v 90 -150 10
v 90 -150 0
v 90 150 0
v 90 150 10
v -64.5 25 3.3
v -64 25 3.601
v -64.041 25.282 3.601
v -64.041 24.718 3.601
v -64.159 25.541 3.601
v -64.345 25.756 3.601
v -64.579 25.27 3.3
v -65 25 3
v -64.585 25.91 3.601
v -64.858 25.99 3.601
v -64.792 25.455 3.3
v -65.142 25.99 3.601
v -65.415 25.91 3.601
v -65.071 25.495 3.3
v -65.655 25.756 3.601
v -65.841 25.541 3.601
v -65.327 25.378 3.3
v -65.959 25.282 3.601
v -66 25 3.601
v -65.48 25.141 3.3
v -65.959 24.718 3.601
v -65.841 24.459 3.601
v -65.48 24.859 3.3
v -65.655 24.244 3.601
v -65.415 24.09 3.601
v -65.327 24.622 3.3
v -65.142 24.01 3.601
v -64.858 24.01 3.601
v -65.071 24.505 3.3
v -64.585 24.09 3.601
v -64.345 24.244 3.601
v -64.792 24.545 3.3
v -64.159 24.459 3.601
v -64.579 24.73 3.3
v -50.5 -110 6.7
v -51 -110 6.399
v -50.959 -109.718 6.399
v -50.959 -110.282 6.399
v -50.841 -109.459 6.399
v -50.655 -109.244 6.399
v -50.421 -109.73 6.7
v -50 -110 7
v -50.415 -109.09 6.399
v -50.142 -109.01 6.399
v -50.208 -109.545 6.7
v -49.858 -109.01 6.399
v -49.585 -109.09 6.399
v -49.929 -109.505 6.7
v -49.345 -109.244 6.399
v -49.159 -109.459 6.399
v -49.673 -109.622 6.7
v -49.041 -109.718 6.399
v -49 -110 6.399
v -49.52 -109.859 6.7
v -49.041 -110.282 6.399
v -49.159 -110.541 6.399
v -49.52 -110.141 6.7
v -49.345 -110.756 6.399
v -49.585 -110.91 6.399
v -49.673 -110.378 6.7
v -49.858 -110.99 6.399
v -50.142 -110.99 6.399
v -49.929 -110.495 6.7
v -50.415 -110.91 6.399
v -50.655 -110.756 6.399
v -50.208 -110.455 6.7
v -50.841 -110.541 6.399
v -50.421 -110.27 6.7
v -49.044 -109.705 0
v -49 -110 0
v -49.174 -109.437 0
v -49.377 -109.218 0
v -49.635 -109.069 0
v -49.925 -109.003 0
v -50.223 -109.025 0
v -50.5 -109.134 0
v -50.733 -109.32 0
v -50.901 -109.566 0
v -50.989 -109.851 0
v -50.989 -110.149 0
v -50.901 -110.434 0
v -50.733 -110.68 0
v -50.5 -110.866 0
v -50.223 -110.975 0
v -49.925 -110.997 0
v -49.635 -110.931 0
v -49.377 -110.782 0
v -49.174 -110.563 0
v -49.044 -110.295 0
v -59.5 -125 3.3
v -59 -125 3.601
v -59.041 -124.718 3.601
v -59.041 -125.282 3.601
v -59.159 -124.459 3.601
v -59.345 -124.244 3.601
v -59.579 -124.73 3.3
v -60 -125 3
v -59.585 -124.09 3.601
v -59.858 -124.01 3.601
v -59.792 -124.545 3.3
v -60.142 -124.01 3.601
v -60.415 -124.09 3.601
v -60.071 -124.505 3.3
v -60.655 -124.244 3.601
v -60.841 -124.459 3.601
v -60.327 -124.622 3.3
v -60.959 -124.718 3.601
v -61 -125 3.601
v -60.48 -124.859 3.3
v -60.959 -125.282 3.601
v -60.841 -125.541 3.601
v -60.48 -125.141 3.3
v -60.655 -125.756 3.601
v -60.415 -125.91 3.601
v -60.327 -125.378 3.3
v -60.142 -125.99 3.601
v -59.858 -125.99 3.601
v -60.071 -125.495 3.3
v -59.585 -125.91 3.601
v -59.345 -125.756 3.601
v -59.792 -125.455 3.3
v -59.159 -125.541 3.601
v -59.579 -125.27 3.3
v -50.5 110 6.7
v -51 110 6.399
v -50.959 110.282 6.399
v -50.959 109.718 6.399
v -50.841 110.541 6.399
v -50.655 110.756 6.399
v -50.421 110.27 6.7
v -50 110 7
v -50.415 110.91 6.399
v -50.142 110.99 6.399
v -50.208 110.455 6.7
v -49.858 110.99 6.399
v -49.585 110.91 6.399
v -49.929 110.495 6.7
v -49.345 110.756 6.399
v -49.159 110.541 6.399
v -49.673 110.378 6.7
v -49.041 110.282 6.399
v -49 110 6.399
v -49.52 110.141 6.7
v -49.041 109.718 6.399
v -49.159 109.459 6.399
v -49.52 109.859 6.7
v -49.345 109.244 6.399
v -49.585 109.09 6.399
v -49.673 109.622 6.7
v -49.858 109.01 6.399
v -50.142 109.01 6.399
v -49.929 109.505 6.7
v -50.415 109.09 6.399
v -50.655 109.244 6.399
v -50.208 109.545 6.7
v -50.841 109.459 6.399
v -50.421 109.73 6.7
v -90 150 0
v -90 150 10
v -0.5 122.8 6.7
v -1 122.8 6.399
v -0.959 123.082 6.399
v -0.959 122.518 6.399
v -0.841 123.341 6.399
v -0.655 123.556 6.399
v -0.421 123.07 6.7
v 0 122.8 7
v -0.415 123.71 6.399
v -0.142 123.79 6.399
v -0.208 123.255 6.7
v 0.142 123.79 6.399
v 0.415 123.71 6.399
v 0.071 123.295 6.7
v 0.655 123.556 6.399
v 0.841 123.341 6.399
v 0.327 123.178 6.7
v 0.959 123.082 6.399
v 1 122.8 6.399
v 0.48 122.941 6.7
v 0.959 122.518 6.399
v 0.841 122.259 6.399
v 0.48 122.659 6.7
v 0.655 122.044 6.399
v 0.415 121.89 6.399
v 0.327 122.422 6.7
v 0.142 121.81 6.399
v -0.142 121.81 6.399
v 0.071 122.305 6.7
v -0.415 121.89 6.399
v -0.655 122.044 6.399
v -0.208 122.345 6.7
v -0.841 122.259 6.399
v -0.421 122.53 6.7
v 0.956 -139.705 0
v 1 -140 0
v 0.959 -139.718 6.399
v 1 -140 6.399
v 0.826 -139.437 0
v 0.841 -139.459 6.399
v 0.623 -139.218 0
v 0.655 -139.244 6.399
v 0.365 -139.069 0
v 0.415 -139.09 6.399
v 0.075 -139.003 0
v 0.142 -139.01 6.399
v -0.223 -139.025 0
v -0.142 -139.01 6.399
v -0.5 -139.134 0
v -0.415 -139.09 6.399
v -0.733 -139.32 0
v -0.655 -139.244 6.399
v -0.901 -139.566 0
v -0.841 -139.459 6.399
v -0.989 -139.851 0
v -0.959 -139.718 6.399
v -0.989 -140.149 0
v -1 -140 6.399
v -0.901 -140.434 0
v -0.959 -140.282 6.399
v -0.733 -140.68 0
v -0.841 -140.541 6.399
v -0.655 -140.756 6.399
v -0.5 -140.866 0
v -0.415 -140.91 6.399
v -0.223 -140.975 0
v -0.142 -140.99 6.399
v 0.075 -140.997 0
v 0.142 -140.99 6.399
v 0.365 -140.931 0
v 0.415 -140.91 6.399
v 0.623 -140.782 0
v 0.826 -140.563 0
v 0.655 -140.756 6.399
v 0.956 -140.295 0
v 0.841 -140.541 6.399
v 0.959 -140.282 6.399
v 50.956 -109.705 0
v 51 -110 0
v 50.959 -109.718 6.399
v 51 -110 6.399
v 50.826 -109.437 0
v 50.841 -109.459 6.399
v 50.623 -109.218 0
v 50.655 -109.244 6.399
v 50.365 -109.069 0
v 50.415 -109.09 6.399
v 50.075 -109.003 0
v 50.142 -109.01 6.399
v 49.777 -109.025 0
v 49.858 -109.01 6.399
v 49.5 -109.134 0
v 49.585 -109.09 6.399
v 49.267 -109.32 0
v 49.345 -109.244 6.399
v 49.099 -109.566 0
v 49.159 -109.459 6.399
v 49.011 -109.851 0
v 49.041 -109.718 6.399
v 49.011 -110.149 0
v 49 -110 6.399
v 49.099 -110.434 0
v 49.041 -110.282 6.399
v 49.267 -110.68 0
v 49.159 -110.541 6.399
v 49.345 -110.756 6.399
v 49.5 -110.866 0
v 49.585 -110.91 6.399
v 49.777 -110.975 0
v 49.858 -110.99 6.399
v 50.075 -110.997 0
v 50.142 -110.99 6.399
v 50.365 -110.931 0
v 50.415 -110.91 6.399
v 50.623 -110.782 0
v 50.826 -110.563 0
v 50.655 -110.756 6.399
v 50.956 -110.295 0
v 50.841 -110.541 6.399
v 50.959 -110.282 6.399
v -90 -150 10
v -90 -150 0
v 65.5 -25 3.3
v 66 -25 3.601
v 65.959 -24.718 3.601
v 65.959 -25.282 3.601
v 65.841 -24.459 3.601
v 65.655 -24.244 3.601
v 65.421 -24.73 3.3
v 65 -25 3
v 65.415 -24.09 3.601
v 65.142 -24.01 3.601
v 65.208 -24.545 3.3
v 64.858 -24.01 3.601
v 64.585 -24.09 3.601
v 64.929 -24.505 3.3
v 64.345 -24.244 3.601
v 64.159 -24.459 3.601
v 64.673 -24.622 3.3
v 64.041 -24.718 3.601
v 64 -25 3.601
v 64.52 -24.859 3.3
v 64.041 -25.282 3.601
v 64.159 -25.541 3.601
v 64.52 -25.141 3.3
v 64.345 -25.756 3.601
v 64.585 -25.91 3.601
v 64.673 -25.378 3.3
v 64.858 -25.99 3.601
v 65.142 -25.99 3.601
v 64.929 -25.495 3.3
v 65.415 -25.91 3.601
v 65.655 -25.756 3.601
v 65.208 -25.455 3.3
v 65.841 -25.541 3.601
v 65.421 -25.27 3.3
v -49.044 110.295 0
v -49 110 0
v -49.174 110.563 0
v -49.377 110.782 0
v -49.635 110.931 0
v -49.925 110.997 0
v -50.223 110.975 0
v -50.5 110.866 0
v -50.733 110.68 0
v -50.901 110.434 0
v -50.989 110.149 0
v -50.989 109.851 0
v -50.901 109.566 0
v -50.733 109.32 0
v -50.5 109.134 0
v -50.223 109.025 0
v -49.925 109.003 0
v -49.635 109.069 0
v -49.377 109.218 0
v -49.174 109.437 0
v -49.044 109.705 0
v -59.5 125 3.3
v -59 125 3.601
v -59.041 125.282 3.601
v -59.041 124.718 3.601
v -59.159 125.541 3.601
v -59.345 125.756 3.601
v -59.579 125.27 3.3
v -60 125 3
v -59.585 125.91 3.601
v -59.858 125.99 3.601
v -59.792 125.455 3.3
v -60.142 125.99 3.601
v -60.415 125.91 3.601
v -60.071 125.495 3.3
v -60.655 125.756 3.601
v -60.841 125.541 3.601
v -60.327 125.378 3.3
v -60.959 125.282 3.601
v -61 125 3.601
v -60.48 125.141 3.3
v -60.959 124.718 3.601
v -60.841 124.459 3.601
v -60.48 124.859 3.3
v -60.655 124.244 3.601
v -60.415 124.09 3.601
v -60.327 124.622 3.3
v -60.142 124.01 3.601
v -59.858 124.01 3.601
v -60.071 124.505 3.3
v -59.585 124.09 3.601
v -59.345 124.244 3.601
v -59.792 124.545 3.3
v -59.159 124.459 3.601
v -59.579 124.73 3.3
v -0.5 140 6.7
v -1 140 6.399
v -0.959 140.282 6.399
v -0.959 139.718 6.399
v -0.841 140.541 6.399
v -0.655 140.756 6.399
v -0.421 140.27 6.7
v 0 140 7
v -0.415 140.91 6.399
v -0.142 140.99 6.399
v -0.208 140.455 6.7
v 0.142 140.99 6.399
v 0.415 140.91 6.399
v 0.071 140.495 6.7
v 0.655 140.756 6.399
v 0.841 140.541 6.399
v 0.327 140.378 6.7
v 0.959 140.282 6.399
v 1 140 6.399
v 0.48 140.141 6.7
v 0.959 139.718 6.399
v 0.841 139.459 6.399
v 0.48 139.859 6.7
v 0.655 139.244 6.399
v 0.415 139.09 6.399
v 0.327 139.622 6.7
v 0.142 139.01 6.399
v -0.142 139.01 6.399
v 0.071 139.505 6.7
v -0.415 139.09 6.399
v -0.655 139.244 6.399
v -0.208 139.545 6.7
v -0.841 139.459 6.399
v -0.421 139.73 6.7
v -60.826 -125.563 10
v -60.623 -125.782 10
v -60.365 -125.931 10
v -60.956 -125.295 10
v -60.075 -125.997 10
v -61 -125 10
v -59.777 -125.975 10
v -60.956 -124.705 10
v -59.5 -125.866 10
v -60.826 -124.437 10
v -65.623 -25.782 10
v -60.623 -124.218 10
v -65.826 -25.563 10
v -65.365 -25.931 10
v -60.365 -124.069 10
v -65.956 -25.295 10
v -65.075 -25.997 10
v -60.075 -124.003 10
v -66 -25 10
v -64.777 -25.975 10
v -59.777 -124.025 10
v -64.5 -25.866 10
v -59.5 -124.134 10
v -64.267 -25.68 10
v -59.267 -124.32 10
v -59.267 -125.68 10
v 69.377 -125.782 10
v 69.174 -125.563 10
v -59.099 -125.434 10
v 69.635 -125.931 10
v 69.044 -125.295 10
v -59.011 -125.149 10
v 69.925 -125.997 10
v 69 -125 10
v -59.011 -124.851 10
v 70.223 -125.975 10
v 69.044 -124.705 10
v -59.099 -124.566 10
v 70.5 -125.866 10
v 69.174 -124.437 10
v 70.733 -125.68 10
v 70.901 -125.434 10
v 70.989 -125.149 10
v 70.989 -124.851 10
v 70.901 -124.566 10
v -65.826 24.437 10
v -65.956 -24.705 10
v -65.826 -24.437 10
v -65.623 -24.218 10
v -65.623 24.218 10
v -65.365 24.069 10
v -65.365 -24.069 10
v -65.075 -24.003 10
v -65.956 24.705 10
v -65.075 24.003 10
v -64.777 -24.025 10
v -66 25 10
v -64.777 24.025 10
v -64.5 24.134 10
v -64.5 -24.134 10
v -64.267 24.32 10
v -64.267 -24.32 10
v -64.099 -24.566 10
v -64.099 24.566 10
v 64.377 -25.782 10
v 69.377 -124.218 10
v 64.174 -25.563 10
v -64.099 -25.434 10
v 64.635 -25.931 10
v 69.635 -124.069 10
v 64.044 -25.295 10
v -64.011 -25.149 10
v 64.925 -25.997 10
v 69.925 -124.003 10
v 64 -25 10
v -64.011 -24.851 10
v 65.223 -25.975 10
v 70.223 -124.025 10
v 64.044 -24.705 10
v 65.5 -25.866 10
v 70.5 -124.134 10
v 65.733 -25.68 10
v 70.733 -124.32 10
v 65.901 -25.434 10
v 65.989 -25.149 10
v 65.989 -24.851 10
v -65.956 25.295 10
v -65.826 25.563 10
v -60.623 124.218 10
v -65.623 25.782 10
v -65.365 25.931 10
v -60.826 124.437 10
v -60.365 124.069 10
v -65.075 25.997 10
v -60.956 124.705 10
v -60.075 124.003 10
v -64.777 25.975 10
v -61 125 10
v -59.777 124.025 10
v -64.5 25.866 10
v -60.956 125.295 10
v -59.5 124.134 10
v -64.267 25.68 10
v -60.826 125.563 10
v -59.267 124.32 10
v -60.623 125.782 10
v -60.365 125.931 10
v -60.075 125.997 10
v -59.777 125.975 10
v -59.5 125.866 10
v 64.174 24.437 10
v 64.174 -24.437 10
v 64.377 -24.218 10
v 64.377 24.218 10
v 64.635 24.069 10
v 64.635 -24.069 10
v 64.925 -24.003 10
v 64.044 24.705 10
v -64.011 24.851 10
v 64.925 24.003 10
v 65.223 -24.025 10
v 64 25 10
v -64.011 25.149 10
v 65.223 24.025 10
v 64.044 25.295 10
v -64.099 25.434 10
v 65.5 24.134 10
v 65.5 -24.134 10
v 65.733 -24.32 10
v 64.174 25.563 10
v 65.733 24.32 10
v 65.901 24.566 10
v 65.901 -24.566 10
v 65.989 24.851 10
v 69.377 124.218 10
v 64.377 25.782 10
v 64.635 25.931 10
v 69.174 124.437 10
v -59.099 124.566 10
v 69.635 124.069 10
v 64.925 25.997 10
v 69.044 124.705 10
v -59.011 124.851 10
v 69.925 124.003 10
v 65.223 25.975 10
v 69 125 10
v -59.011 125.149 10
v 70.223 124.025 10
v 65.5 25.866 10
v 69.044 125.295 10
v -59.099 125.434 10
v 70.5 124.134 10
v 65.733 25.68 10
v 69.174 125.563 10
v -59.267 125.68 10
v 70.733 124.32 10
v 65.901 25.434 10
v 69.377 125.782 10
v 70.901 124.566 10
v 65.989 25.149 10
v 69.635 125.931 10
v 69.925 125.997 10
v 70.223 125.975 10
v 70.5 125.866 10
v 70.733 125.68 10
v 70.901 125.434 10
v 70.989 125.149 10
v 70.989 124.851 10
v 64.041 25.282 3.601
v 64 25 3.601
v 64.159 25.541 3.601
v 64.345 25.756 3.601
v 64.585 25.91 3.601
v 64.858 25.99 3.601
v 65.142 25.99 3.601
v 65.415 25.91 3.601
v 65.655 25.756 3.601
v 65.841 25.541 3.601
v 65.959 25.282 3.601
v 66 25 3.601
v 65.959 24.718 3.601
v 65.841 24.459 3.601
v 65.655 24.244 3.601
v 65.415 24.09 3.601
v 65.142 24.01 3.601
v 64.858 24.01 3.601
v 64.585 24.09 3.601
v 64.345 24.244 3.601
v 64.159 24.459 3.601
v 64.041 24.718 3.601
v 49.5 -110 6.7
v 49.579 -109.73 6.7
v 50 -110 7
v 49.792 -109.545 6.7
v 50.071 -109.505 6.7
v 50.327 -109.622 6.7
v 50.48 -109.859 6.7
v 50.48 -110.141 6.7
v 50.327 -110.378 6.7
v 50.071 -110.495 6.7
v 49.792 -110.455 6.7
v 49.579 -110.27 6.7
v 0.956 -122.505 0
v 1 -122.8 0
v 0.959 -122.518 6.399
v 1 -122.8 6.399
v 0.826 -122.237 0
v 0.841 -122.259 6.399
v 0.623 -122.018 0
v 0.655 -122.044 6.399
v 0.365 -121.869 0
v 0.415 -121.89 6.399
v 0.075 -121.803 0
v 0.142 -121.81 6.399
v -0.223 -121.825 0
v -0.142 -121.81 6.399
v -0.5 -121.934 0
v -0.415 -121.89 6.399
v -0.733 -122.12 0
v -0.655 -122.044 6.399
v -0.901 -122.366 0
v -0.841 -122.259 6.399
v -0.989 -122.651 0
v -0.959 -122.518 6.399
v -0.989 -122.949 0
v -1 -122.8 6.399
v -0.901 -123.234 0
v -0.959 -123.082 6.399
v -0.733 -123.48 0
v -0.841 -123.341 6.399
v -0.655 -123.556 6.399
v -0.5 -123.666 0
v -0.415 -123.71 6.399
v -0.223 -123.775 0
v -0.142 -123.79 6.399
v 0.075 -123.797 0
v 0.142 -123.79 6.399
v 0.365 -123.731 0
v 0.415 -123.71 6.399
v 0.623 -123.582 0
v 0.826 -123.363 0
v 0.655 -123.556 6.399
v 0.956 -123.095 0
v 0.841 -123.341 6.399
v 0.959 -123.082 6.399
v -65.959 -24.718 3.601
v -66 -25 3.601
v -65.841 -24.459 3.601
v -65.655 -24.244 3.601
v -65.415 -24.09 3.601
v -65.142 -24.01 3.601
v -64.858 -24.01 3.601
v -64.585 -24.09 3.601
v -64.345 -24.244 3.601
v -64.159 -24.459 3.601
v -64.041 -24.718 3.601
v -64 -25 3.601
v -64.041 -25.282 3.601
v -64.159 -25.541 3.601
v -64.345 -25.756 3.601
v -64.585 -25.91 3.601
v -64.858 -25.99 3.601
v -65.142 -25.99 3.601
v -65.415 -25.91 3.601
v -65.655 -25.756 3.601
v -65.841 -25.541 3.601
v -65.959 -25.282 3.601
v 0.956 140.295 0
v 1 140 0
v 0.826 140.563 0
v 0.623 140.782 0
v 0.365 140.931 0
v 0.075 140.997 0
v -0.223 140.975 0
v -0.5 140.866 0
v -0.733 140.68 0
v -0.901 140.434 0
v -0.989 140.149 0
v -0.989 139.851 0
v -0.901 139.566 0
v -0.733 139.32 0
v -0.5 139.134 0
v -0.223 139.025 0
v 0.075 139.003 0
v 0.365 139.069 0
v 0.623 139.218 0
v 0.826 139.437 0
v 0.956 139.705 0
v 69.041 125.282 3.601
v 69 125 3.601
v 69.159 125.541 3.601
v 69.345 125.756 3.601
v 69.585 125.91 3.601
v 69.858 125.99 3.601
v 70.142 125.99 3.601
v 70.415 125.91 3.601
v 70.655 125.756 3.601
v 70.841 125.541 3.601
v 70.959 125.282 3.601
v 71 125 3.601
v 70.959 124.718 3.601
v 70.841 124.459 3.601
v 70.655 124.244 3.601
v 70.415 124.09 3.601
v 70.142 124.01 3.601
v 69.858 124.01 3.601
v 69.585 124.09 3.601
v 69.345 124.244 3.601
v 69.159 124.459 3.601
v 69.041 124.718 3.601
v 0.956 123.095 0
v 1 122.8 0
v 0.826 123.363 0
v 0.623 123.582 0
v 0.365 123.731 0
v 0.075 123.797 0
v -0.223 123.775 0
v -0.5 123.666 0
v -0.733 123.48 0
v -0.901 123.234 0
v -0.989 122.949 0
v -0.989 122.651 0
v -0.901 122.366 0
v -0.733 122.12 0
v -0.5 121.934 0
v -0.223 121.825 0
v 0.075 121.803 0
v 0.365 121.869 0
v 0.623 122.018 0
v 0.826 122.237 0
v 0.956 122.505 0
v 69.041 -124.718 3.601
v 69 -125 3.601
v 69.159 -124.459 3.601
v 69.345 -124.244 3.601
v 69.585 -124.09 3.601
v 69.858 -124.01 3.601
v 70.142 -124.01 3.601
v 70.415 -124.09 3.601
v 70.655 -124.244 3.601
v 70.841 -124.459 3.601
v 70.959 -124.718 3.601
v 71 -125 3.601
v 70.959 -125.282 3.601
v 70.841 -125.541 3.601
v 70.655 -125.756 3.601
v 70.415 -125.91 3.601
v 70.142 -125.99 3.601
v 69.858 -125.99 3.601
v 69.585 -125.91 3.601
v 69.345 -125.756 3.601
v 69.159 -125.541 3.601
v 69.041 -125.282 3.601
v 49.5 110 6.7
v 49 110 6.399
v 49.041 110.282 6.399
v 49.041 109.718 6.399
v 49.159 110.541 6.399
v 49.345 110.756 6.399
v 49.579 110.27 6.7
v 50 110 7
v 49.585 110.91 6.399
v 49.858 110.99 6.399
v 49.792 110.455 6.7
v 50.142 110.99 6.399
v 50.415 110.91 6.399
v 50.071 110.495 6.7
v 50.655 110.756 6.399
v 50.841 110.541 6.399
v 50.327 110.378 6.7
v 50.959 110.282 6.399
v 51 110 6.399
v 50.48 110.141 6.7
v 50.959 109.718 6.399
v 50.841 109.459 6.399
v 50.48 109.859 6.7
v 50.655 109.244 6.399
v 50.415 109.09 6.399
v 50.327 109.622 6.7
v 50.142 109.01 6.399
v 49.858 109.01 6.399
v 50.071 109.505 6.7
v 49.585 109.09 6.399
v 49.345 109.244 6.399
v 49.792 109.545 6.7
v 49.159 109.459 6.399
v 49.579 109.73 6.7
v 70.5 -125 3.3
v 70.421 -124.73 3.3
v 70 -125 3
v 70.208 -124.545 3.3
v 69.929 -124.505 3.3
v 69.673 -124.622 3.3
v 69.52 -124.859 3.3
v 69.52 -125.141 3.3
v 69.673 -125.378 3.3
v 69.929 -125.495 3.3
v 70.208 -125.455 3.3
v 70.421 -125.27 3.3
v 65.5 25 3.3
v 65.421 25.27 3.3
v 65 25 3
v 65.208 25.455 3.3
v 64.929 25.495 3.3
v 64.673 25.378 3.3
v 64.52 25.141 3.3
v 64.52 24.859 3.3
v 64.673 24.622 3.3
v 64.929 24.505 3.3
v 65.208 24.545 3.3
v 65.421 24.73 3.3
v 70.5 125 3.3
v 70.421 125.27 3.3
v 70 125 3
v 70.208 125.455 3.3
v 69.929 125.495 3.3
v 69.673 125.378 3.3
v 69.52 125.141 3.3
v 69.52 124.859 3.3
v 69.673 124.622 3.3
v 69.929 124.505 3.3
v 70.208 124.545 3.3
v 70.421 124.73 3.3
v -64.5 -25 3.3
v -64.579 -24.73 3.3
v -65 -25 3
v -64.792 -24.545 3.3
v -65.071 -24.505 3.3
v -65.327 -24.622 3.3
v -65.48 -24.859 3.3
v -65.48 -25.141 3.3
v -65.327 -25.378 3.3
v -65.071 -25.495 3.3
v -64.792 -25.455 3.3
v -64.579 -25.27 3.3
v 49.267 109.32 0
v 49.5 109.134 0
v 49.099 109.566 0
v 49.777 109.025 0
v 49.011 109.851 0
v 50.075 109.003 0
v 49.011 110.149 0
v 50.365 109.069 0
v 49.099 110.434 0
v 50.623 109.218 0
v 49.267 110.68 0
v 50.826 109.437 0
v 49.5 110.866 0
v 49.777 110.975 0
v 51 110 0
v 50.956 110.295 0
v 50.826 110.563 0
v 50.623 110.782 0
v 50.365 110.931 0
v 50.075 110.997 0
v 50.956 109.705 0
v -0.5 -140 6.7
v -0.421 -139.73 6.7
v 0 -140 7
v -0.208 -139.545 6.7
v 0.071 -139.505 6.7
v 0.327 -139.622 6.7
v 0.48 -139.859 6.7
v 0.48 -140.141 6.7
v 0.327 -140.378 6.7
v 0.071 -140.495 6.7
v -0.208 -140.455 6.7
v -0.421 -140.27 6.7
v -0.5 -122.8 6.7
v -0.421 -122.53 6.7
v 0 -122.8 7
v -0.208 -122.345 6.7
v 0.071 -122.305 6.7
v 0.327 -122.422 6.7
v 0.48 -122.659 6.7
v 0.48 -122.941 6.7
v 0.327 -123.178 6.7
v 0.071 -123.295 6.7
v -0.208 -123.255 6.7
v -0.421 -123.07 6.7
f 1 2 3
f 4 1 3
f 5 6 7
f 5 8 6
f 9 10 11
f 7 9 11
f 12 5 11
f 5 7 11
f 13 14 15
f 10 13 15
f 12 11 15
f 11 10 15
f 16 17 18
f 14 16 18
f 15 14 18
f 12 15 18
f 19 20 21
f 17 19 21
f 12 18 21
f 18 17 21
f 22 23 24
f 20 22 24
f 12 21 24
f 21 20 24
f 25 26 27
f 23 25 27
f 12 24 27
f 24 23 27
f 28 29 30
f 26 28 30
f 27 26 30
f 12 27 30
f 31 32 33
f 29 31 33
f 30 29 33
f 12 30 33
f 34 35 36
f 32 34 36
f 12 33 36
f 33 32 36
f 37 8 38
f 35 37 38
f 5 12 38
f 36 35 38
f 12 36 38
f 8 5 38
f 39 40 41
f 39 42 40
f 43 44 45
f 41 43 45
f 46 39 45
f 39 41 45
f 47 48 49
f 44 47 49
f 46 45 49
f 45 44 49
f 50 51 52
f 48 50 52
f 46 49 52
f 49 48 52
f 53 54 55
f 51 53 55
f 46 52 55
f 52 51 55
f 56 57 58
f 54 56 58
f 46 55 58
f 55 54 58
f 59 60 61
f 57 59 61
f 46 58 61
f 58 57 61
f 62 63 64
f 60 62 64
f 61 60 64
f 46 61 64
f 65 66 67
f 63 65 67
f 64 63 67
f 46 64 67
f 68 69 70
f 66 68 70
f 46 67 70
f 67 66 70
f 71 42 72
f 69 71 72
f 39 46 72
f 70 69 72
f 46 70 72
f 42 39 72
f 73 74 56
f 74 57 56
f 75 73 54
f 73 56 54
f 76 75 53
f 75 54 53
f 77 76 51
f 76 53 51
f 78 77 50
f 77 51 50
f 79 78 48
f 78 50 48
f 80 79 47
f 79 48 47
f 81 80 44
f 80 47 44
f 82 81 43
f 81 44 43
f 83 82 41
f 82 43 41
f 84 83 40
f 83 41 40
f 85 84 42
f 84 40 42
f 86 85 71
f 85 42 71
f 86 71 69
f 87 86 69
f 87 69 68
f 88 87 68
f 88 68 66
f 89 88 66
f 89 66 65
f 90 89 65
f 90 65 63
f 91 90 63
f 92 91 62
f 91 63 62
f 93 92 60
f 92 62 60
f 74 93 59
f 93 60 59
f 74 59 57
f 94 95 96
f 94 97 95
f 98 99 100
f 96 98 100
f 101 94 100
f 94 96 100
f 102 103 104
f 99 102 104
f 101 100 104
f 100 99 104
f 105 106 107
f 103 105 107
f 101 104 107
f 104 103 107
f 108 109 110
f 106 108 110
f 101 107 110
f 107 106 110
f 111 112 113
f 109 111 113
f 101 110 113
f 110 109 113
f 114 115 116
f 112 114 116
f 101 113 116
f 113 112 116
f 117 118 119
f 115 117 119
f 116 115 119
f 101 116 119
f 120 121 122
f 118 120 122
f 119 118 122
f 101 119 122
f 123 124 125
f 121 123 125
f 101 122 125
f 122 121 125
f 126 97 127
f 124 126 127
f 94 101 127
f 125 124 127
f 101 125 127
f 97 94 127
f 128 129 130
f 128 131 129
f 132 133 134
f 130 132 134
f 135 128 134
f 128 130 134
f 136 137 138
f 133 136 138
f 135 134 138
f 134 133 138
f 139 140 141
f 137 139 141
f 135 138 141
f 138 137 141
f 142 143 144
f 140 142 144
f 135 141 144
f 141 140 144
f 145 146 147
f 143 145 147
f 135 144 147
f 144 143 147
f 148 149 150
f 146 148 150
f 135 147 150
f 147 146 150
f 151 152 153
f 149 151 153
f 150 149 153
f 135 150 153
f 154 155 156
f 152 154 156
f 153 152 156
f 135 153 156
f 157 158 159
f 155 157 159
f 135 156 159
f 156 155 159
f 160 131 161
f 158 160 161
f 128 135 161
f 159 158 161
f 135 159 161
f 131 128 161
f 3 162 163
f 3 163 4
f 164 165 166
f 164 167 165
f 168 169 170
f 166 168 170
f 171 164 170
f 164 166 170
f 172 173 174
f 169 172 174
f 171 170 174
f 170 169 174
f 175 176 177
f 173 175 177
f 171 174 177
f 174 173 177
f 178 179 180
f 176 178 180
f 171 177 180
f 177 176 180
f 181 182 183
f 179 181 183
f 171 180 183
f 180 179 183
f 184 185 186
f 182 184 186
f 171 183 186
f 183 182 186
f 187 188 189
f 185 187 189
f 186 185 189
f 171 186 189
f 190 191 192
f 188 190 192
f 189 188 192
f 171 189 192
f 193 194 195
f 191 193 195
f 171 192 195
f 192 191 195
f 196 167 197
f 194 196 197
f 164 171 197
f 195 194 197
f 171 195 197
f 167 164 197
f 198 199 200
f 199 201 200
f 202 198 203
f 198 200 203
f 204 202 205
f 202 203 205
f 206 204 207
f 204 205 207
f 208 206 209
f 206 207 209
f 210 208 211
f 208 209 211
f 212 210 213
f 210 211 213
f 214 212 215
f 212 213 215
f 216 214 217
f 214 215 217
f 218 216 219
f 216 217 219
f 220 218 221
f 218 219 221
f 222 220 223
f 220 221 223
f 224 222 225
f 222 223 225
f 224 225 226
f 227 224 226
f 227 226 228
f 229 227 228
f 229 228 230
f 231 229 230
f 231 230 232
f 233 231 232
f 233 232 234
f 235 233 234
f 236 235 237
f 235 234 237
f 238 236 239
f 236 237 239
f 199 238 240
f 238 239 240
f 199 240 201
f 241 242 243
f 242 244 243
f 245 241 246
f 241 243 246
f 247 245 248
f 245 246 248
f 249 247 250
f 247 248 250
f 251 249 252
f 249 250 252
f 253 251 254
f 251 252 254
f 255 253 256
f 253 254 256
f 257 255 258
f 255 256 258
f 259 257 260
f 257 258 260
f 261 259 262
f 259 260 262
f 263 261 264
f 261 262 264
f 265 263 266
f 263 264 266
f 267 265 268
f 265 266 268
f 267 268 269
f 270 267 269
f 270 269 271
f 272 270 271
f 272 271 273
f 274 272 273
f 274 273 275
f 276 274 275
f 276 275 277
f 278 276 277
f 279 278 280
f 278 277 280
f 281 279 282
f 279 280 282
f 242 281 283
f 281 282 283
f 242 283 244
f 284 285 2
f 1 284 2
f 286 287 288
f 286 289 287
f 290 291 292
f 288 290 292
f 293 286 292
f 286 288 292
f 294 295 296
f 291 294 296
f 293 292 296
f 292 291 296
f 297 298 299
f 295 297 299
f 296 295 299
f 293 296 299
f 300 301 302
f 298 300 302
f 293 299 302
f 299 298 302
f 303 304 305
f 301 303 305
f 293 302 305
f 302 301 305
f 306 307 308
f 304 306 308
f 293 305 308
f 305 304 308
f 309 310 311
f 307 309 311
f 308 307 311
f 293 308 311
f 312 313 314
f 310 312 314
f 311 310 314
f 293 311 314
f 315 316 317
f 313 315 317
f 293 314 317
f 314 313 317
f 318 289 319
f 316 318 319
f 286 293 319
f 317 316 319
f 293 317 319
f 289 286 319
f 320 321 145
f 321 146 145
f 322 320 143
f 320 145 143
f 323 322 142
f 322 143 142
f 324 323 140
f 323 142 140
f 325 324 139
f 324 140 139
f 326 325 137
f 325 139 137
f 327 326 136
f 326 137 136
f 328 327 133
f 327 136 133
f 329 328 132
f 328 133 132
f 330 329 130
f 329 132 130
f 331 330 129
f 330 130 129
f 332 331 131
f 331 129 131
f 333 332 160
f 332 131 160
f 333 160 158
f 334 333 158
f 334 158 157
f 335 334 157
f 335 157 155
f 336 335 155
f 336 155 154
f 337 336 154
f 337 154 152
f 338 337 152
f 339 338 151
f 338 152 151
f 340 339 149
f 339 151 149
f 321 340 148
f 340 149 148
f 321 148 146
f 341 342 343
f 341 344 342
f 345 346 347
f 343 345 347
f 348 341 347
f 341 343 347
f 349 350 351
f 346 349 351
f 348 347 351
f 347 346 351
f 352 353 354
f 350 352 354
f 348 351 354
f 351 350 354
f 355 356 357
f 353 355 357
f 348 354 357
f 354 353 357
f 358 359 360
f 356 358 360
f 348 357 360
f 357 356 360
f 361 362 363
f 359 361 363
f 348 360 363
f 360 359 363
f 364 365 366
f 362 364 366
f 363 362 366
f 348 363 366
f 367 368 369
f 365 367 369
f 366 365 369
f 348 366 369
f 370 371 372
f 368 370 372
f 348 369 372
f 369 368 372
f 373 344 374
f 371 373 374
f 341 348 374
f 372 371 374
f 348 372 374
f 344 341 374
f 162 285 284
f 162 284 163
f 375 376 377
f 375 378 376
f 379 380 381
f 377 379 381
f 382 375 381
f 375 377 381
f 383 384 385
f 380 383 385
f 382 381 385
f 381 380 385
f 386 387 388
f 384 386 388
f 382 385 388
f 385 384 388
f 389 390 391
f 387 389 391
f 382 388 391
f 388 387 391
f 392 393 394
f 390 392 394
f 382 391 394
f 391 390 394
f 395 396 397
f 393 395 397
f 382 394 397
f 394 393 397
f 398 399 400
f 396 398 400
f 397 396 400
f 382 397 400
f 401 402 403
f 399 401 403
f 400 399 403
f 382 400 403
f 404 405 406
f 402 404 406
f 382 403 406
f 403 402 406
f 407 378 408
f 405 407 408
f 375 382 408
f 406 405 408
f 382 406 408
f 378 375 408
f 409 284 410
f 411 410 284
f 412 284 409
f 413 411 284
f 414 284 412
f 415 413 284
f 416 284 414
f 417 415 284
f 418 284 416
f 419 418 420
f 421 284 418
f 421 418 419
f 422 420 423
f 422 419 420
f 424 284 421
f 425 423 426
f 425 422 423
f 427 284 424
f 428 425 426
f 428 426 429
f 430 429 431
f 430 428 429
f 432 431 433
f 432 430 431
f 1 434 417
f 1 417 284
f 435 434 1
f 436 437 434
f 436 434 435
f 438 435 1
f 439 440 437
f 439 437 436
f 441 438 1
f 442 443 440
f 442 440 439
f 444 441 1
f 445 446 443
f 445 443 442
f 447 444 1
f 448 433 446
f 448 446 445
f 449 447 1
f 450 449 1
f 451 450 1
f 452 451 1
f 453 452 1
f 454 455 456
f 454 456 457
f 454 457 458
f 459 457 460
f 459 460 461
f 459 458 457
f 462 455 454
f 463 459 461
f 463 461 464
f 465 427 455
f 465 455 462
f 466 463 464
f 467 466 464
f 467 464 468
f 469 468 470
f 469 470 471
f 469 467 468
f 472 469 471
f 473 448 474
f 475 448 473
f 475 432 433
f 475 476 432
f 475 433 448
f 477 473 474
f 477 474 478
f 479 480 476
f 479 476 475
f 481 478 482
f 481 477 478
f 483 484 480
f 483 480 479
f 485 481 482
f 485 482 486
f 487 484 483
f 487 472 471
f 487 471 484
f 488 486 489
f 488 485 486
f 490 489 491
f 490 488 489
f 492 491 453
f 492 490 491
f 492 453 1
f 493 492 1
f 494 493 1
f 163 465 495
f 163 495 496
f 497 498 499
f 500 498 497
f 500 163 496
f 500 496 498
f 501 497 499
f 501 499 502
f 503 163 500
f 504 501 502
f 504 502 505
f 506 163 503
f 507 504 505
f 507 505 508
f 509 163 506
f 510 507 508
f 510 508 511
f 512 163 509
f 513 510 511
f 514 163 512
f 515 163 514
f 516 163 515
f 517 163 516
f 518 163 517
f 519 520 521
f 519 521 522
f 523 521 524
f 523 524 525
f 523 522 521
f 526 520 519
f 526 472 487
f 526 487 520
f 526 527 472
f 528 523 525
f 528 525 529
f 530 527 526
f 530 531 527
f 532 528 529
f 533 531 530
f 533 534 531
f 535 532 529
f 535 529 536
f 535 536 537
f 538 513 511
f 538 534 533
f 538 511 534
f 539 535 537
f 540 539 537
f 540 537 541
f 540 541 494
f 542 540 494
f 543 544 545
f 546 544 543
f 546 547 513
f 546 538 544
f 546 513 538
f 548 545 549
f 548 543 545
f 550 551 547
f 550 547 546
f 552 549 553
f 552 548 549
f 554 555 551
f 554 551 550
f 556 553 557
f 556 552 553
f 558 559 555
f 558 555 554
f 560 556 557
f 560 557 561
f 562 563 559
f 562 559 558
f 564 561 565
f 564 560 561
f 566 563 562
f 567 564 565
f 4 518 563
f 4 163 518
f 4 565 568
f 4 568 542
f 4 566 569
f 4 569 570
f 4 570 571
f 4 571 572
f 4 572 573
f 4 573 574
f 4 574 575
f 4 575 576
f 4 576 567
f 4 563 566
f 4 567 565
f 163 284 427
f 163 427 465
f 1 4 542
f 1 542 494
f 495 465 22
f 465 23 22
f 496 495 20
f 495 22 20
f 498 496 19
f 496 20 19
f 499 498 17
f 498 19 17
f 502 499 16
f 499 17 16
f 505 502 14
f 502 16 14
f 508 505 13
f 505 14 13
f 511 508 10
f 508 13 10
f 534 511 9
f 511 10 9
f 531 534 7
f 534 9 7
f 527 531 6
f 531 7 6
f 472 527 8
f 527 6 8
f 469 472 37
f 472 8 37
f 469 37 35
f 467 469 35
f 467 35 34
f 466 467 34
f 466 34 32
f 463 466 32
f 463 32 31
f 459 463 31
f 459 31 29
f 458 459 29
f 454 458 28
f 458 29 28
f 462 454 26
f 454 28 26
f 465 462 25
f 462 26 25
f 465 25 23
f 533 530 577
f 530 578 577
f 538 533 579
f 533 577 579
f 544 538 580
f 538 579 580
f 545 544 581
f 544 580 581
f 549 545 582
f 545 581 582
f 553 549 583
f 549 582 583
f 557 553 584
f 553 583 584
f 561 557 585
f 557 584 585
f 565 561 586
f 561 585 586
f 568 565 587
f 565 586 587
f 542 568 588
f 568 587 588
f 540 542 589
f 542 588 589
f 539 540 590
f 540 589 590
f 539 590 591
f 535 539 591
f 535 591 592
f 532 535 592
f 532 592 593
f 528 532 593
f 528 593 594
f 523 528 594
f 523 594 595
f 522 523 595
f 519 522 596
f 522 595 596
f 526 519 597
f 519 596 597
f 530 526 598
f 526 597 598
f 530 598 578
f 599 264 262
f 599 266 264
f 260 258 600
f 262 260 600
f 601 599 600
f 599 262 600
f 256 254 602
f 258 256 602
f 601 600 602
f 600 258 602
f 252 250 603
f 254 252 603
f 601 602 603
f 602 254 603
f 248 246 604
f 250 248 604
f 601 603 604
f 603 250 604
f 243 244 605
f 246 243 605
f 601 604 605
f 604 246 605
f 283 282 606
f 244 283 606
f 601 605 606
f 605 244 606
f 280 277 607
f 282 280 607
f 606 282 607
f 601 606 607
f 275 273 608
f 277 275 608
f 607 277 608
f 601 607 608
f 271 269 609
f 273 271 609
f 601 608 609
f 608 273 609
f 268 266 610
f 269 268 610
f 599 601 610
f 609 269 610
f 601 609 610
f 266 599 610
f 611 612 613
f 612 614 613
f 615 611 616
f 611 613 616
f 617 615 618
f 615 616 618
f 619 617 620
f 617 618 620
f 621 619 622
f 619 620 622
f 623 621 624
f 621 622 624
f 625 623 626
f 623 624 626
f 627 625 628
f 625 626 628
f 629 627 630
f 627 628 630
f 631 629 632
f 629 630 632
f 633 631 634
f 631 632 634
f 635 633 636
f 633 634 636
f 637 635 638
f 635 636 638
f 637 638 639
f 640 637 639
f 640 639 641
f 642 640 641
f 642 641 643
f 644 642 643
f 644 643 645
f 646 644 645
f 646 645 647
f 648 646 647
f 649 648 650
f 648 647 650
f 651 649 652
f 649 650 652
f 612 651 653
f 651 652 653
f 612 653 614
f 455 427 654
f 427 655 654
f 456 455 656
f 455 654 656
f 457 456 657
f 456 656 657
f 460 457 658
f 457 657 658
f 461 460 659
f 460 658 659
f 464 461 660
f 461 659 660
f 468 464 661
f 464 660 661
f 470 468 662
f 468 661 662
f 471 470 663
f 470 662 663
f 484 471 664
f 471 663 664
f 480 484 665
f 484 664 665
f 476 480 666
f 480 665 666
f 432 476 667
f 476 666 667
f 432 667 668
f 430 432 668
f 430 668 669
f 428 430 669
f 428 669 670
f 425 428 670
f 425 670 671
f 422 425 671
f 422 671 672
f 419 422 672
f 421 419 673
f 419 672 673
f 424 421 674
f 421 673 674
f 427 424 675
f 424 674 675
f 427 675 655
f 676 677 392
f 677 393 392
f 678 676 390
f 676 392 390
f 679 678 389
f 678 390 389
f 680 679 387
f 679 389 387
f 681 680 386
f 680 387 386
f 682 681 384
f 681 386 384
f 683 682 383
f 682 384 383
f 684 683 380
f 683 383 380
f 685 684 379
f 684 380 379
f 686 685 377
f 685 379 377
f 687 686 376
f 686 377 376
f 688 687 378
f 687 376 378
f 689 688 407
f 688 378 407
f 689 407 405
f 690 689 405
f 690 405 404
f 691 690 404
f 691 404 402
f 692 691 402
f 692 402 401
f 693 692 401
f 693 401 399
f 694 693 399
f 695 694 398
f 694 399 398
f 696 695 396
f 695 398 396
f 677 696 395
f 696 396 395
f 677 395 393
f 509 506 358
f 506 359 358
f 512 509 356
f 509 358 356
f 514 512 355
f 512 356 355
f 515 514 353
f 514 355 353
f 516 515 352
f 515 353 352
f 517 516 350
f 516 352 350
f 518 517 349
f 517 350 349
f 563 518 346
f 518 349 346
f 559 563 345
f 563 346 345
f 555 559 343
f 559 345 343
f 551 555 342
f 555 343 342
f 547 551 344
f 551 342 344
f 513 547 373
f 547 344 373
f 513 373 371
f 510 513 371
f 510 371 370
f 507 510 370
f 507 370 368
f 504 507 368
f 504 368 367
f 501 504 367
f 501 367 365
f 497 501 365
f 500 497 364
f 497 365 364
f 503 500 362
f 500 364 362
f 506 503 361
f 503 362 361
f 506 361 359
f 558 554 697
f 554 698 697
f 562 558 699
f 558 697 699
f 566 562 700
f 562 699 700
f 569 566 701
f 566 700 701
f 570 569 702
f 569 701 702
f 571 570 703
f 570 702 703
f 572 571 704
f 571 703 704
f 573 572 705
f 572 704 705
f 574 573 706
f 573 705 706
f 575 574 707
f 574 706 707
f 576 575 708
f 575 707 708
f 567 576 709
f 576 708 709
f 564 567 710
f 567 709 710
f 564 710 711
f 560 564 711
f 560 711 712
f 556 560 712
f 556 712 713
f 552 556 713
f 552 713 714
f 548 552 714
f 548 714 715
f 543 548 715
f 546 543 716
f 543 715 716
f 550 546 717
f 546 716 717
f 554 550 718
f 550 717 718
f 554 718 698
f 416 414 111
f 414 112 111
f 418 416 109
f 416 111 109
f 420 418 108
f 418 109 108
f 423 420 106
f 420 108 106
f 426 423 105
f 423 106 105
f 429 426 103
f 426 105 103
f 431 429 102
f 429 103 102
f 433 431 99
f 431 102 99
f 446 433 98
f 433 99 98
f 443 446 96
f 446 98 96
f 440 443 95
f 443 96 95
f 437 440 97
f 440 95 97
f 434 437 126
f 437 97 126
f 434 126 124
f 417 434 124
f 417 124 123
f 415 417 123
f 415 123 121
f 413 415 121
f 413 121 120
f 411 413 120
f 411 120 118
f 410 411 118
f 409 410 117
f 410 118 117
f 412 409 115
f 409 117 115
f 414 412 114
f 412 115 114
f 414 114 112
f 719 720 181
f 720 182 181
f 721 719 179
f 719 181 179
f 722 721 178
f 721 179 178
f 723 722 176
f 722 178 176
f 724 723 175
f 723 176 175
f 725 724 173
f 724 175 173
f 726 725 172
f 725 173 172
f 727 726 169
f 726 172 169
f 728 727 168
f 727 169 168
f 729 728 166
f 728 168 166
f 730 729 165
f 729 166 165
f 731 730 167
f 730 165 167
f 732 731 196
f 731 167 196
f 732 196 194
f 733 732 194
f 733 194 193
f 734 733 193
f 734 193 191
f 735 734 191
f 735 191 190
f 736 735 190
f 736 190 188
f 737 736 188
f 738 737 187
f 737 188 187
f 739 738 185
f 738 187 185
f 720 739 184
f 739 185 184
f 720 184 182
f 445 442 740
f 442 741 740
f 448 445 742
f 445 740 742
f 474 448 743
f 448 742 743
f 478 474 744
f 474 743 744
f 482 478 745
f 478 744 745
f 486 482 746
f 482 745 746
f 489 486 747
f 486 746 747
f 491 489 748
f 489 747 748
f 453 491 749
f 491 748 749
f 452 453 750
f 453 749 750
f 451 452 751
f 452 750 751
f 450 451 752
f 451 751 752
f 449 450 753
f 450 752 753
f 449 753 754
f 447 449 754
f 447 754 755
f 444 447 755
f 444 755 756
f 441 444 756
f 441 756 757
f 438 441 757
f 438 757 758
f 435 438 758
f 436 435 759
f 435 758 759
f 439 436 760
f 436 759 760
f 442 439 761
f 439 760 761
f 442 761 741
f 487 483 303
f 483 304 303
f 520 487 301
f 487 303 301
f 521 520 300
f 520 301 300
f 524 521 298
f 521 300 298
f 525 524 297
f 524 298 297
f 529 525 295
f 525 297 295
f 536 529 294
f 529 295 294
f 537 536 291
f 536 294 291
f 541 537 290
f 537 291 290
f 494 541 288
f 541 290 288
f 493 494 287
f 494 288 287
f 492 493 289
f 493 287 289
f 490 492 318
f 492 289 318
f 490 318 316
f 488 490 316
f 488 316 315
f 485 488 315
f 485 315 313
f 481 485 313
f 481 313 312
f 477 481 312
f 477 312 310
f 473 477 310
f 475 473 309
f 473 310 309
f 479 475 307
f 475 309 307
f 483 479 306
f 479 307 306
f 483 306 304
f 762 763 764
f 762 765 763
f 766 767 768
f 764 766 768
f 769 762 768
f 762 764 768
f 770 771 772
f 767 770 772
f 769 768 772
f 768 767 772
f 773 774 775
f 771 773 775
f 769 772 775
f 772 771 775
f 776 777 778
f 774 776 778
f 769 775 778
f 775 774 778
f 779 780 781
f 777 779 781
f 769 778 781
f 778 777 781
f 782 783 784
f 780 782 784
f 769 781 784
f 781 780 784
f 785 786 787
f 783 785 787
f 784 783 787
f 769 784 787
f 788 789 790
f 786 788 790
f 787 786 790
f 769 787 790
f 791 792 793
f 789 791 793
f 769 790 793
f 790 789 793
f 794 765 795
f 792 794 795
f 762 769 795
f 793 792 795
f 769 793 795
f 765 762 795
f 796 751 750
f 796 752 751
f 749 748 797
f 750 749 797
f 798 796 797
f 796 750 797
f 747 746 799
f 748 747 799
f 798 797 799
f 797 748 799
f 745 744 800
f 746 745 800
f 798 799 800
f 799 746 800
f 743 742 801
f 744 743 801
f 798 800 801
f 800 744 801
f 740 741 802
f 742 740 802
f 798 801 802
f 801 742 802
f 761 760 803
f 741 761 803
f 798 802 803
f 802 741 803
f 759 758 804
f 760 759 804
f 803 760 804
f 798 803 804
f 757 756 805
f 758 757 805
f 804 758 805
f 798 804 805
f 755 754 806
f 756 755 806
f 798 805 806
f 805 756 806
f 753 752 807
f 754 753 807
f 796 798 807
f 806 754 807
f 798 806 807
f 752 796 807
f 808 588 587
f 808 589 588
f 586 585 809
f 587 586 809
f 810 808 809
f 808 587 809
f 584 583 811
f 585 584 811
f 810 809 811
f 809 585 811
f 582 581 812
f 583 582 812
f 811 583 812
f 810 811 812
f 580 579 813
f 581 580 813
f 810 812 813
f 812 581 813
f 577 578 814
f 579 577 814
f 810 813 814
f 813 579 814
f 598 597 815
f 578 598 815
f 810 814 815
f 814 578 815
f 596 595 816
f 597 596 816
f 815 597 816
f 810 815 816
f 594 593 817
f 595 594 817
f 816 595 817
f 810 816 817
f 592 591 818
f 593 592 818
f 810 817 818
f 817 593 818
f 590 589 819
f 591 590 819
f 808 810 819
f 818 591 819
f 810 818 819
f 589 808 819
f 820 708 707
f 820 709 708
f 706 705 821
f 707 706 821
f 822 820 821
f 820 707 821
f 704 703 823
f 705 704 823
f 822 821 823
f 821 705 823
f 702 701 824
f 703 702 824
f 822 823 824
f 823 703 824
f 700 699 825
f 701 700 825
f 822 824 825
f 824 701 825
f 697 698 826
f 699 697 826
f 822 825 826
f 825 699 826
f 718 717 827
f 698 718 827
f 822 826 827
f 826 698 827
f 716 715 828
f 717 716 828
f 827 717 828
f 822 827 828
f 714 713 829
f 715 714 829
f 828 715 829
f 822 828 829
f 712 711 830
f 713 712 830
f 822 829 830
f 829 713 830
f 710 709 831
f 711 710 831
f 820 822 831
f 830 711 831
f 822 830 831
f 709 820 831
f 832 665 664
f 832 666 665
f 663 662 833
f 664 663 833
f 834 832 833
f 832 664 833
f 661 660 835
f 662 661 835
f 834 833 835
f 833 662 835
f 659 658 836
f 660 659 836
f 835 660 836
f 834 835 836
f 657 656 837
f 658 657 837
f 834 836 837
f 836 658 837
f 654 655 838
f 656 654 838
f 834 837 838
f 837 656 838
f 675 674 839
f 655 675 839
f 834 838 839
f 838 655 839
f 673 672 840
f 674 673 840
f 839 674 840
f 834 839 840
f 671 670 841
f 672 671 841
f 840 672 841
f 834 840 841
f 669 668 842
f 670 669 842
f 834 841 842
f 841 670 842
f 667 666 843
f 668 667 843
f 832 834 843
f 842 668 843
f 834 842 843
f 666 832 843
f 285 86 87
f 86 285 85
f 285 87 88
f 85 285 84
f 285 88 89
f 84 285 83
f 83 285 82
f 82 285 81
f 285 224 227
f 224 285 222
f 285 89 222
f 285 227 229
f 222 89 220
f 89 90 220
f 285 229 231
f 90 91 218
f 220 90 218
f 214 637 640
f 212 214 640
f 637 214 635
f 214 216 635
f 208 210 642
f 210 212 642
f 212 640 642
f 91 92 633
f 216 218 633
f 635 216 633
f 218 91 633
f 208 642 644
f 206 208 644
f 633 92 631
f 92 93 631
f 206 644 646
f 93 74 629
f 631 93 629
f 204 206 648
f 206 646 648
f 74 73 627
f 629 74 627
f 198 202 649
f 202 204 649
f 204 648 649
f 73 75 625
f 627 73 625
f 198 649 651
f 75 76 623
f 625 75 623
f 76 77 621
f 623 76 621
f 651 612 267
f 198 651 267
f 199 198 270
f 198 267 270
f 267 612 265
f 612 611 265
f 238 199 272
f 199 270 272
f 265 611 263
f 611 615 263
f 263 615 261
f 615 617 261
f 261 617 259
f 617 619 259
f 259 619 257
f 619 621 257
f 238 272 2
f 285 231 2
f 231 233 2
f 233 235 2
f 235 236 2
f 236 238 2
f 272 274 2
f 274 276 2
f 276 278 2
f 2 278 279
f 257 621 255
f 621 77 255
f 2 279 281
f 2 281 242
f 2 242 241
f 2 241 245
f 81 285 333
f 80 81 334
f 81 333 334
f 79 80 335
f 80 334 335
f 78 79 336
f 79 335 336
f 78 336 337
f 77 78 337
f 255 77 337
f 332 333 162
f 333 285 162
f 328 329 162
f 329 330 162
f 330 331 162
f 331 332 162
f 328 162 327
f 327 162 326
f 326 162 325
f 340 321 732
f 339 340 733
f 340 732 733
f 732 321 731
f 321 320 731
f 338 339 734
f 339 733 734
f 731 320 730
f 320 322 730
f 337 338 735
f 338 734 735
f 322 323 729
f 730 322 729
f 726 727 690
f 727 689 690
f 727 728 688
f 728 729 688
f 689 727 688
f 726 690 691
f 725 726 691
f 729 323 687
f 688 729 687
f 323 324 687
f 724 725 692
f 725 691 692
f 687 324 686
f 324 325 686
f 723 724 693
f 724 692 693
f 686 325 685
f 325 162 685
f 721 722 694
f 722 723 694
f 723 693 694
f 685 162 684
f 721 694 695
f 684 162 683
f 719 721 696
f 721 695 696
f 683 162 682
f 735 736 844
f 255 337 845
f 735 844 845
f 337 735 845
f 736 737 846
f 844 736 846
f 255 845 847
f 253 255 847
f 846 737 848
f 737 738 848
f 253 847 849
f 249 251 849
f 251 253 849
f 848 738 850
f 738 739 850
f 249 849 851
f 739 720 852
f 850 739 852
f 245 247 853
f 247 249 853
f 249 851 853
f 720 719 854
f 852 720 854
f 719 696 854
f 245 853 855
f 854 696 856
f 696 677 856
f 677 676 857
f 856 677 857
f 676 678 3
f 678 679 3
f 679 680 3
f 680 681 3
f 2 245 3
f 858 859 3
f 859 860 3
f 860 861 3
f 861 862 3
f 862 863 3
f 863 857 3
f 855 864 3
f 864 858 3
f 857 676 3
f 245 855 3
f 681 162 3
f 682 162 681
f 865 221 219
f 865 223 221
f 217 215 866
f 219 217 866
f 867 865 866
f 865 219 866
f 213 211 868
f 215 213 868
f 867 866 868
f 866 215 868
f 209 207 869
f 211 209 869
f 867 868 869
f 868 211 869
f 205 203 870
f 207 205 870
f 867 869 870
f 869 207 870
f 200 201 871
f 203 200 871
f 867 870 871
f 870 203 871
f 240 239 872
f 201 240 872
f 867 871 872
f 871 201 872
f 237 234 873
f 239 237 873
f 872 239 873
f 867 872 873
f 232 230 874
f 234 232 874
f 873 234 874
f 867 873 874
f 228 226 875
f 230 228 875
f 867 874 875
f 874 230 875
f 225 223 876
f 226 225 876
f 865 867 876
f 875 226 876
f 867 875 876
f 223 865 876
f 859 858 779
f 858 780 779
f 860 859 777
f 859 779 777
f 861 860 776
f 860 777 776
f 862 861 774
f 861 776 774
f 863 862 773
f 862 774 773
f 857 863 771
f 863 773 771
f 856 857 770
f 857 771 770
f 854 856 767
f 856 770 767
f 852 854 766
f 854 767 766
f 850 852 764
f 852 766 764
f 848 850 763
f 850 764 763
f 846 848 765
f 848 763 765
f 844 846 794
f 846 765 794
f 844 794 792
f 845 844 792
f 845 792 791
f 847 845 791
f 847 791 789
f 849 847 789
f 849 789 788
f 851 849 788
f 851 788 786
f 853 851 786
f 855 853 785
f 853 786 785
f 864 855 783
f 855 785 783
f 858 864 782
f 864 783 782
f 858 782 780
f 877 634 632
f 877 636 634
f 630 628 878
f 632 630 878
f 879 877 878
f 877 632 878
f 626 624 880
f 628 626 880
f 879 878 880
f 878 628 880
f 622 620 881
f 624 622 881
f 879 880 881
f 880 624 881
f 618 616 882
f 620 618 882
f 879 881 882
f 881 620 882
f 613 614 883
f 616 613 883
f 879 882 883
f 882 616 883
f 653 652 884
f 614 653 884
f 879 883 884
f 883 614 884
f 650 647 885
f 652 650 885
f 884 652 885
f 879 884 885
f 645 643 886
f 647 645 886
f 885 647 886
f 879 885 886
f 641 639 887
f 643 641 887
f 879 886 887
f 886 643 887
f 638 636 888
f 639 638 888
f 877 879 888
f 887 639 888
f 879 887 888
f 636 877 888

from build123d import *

# Parameters (mm, degrees)
SKETCH_1_W      = 180
SKETCH_1_H      = 300
EXTRUDE_1_DEPTH = 10
F_2_0MM_1_D     = 2
F_2_0MM_1_DEPTH = 6.399139381
F_2_0MM_1_TIP   = 0.600860619
F_2_0MM_2_D     = 2
F_2_0MM_2_DEPTH = 6.399139381
F_2_0MM_2_TIP   = 0.600860619
F_2_0MM_3_D     = 2
F_2_0MM_3_DEPTH = 6.399139381
F_2_0MM_3_TIP   = 0.600860619
F_2_0MM_4_D     = 2
F_2_0MM_4_DEPTH = 6.399139381
F_2_0MM_4_TIP   = 0.600860619


with BuildPart() as part:
    # 草圖1 → 填料-伸長1 (new body)
    with BuildSketch(Plane.XY):
        Rectangle(SKETCH_1_W, SKETCH_1_H)
    extrude(amount=EXTRUDE_1_DEPTH)

    # Ø2.0mm 定位孔1
    with Locations(Plane(origin=(50, -110, 0), x_dir=(-1, 0, 0), z_dir=(0, 0, -1))):
        with Locations((0, 0), (0, 220), (100, 220), (100, 0)):
            Hole(F_2_0MM_1_D / 2, depth=F_2_0MM_1_DEPTH)
            with Locations((0, 0, -(F_2_0MM_1_DEPTH + F_2_0MM_1_TIP / 2))):  # 118° drill point
                Cone(0, F_2_0MM_1_D / 2, F_2_0MM_1_TIP, mode=Mode.SUBTRACT)

    # Ø2.0mm 定位孔2
    with Locations(Plane(origin=(-60, 125, 10), x_dir=(1, 0, 0), z_dir=(0, 0, 1))):
        with Locations((0, 0), (130, 0), (130, -250), (0, -250)):
            Hole(F_2_0MM_2_D / 2, depth=F_2_0MM_2_DEPTH)
            with Locations((0, 0, -(F_2_0MM_2_DEPTH + F_2_0MM_2_TIP / 2))):  # 118° drill point
                Cone(0, F_2_0MM_2_D / 2, F_2_0MM_2_TIP, mode=Mode.SUBTRACT)

    # Ø2.0mm 定位孔3
    with Locations(Plane(origin=(-65, 25, 10), x_dir=(1, 0, 0), z_dir=(0, 0, 1))):
        with Locations((0, 0), (130, 0), (130, -50), (0, -50)):
            Hole(F_2_0MM_3_D / 2, depth=F_2_0MM_3_DEPTH)
            with Locations((0, 0, -(F_2_0MM_3_DEPTH + F_2_0MM_3_TIP / 2))):  # 118° drill point
                Cone(0, F_2_0MM_3_D / 2, F_2_0MM_3_TIP, mode=Mode.SUBTRACT)

    # Ø2.0mm 定位孔4
    with Locations(Plane(origin=(0, 140, 0), x_dir=(-1, 0, 0), z_dir=(0, 0, -1))):
        with Locations((0, 0), (0, -17.2), (0, -262.8), (0, -280)):
            Hole(F_2_0MM_4_D / 2, depth=F_2_0MM_4_DEPTH)
            with Locations((0, 0, -(F_2_0MM_4_DEPTH + F_2_0MM_4_TIP / 2))):  # 118° drill point
                Cone(0, F_2_0MM_4_D / 2, F_2_0MM_4_TIP, mode=Mode.SUBTRACT)


solid = part.part
